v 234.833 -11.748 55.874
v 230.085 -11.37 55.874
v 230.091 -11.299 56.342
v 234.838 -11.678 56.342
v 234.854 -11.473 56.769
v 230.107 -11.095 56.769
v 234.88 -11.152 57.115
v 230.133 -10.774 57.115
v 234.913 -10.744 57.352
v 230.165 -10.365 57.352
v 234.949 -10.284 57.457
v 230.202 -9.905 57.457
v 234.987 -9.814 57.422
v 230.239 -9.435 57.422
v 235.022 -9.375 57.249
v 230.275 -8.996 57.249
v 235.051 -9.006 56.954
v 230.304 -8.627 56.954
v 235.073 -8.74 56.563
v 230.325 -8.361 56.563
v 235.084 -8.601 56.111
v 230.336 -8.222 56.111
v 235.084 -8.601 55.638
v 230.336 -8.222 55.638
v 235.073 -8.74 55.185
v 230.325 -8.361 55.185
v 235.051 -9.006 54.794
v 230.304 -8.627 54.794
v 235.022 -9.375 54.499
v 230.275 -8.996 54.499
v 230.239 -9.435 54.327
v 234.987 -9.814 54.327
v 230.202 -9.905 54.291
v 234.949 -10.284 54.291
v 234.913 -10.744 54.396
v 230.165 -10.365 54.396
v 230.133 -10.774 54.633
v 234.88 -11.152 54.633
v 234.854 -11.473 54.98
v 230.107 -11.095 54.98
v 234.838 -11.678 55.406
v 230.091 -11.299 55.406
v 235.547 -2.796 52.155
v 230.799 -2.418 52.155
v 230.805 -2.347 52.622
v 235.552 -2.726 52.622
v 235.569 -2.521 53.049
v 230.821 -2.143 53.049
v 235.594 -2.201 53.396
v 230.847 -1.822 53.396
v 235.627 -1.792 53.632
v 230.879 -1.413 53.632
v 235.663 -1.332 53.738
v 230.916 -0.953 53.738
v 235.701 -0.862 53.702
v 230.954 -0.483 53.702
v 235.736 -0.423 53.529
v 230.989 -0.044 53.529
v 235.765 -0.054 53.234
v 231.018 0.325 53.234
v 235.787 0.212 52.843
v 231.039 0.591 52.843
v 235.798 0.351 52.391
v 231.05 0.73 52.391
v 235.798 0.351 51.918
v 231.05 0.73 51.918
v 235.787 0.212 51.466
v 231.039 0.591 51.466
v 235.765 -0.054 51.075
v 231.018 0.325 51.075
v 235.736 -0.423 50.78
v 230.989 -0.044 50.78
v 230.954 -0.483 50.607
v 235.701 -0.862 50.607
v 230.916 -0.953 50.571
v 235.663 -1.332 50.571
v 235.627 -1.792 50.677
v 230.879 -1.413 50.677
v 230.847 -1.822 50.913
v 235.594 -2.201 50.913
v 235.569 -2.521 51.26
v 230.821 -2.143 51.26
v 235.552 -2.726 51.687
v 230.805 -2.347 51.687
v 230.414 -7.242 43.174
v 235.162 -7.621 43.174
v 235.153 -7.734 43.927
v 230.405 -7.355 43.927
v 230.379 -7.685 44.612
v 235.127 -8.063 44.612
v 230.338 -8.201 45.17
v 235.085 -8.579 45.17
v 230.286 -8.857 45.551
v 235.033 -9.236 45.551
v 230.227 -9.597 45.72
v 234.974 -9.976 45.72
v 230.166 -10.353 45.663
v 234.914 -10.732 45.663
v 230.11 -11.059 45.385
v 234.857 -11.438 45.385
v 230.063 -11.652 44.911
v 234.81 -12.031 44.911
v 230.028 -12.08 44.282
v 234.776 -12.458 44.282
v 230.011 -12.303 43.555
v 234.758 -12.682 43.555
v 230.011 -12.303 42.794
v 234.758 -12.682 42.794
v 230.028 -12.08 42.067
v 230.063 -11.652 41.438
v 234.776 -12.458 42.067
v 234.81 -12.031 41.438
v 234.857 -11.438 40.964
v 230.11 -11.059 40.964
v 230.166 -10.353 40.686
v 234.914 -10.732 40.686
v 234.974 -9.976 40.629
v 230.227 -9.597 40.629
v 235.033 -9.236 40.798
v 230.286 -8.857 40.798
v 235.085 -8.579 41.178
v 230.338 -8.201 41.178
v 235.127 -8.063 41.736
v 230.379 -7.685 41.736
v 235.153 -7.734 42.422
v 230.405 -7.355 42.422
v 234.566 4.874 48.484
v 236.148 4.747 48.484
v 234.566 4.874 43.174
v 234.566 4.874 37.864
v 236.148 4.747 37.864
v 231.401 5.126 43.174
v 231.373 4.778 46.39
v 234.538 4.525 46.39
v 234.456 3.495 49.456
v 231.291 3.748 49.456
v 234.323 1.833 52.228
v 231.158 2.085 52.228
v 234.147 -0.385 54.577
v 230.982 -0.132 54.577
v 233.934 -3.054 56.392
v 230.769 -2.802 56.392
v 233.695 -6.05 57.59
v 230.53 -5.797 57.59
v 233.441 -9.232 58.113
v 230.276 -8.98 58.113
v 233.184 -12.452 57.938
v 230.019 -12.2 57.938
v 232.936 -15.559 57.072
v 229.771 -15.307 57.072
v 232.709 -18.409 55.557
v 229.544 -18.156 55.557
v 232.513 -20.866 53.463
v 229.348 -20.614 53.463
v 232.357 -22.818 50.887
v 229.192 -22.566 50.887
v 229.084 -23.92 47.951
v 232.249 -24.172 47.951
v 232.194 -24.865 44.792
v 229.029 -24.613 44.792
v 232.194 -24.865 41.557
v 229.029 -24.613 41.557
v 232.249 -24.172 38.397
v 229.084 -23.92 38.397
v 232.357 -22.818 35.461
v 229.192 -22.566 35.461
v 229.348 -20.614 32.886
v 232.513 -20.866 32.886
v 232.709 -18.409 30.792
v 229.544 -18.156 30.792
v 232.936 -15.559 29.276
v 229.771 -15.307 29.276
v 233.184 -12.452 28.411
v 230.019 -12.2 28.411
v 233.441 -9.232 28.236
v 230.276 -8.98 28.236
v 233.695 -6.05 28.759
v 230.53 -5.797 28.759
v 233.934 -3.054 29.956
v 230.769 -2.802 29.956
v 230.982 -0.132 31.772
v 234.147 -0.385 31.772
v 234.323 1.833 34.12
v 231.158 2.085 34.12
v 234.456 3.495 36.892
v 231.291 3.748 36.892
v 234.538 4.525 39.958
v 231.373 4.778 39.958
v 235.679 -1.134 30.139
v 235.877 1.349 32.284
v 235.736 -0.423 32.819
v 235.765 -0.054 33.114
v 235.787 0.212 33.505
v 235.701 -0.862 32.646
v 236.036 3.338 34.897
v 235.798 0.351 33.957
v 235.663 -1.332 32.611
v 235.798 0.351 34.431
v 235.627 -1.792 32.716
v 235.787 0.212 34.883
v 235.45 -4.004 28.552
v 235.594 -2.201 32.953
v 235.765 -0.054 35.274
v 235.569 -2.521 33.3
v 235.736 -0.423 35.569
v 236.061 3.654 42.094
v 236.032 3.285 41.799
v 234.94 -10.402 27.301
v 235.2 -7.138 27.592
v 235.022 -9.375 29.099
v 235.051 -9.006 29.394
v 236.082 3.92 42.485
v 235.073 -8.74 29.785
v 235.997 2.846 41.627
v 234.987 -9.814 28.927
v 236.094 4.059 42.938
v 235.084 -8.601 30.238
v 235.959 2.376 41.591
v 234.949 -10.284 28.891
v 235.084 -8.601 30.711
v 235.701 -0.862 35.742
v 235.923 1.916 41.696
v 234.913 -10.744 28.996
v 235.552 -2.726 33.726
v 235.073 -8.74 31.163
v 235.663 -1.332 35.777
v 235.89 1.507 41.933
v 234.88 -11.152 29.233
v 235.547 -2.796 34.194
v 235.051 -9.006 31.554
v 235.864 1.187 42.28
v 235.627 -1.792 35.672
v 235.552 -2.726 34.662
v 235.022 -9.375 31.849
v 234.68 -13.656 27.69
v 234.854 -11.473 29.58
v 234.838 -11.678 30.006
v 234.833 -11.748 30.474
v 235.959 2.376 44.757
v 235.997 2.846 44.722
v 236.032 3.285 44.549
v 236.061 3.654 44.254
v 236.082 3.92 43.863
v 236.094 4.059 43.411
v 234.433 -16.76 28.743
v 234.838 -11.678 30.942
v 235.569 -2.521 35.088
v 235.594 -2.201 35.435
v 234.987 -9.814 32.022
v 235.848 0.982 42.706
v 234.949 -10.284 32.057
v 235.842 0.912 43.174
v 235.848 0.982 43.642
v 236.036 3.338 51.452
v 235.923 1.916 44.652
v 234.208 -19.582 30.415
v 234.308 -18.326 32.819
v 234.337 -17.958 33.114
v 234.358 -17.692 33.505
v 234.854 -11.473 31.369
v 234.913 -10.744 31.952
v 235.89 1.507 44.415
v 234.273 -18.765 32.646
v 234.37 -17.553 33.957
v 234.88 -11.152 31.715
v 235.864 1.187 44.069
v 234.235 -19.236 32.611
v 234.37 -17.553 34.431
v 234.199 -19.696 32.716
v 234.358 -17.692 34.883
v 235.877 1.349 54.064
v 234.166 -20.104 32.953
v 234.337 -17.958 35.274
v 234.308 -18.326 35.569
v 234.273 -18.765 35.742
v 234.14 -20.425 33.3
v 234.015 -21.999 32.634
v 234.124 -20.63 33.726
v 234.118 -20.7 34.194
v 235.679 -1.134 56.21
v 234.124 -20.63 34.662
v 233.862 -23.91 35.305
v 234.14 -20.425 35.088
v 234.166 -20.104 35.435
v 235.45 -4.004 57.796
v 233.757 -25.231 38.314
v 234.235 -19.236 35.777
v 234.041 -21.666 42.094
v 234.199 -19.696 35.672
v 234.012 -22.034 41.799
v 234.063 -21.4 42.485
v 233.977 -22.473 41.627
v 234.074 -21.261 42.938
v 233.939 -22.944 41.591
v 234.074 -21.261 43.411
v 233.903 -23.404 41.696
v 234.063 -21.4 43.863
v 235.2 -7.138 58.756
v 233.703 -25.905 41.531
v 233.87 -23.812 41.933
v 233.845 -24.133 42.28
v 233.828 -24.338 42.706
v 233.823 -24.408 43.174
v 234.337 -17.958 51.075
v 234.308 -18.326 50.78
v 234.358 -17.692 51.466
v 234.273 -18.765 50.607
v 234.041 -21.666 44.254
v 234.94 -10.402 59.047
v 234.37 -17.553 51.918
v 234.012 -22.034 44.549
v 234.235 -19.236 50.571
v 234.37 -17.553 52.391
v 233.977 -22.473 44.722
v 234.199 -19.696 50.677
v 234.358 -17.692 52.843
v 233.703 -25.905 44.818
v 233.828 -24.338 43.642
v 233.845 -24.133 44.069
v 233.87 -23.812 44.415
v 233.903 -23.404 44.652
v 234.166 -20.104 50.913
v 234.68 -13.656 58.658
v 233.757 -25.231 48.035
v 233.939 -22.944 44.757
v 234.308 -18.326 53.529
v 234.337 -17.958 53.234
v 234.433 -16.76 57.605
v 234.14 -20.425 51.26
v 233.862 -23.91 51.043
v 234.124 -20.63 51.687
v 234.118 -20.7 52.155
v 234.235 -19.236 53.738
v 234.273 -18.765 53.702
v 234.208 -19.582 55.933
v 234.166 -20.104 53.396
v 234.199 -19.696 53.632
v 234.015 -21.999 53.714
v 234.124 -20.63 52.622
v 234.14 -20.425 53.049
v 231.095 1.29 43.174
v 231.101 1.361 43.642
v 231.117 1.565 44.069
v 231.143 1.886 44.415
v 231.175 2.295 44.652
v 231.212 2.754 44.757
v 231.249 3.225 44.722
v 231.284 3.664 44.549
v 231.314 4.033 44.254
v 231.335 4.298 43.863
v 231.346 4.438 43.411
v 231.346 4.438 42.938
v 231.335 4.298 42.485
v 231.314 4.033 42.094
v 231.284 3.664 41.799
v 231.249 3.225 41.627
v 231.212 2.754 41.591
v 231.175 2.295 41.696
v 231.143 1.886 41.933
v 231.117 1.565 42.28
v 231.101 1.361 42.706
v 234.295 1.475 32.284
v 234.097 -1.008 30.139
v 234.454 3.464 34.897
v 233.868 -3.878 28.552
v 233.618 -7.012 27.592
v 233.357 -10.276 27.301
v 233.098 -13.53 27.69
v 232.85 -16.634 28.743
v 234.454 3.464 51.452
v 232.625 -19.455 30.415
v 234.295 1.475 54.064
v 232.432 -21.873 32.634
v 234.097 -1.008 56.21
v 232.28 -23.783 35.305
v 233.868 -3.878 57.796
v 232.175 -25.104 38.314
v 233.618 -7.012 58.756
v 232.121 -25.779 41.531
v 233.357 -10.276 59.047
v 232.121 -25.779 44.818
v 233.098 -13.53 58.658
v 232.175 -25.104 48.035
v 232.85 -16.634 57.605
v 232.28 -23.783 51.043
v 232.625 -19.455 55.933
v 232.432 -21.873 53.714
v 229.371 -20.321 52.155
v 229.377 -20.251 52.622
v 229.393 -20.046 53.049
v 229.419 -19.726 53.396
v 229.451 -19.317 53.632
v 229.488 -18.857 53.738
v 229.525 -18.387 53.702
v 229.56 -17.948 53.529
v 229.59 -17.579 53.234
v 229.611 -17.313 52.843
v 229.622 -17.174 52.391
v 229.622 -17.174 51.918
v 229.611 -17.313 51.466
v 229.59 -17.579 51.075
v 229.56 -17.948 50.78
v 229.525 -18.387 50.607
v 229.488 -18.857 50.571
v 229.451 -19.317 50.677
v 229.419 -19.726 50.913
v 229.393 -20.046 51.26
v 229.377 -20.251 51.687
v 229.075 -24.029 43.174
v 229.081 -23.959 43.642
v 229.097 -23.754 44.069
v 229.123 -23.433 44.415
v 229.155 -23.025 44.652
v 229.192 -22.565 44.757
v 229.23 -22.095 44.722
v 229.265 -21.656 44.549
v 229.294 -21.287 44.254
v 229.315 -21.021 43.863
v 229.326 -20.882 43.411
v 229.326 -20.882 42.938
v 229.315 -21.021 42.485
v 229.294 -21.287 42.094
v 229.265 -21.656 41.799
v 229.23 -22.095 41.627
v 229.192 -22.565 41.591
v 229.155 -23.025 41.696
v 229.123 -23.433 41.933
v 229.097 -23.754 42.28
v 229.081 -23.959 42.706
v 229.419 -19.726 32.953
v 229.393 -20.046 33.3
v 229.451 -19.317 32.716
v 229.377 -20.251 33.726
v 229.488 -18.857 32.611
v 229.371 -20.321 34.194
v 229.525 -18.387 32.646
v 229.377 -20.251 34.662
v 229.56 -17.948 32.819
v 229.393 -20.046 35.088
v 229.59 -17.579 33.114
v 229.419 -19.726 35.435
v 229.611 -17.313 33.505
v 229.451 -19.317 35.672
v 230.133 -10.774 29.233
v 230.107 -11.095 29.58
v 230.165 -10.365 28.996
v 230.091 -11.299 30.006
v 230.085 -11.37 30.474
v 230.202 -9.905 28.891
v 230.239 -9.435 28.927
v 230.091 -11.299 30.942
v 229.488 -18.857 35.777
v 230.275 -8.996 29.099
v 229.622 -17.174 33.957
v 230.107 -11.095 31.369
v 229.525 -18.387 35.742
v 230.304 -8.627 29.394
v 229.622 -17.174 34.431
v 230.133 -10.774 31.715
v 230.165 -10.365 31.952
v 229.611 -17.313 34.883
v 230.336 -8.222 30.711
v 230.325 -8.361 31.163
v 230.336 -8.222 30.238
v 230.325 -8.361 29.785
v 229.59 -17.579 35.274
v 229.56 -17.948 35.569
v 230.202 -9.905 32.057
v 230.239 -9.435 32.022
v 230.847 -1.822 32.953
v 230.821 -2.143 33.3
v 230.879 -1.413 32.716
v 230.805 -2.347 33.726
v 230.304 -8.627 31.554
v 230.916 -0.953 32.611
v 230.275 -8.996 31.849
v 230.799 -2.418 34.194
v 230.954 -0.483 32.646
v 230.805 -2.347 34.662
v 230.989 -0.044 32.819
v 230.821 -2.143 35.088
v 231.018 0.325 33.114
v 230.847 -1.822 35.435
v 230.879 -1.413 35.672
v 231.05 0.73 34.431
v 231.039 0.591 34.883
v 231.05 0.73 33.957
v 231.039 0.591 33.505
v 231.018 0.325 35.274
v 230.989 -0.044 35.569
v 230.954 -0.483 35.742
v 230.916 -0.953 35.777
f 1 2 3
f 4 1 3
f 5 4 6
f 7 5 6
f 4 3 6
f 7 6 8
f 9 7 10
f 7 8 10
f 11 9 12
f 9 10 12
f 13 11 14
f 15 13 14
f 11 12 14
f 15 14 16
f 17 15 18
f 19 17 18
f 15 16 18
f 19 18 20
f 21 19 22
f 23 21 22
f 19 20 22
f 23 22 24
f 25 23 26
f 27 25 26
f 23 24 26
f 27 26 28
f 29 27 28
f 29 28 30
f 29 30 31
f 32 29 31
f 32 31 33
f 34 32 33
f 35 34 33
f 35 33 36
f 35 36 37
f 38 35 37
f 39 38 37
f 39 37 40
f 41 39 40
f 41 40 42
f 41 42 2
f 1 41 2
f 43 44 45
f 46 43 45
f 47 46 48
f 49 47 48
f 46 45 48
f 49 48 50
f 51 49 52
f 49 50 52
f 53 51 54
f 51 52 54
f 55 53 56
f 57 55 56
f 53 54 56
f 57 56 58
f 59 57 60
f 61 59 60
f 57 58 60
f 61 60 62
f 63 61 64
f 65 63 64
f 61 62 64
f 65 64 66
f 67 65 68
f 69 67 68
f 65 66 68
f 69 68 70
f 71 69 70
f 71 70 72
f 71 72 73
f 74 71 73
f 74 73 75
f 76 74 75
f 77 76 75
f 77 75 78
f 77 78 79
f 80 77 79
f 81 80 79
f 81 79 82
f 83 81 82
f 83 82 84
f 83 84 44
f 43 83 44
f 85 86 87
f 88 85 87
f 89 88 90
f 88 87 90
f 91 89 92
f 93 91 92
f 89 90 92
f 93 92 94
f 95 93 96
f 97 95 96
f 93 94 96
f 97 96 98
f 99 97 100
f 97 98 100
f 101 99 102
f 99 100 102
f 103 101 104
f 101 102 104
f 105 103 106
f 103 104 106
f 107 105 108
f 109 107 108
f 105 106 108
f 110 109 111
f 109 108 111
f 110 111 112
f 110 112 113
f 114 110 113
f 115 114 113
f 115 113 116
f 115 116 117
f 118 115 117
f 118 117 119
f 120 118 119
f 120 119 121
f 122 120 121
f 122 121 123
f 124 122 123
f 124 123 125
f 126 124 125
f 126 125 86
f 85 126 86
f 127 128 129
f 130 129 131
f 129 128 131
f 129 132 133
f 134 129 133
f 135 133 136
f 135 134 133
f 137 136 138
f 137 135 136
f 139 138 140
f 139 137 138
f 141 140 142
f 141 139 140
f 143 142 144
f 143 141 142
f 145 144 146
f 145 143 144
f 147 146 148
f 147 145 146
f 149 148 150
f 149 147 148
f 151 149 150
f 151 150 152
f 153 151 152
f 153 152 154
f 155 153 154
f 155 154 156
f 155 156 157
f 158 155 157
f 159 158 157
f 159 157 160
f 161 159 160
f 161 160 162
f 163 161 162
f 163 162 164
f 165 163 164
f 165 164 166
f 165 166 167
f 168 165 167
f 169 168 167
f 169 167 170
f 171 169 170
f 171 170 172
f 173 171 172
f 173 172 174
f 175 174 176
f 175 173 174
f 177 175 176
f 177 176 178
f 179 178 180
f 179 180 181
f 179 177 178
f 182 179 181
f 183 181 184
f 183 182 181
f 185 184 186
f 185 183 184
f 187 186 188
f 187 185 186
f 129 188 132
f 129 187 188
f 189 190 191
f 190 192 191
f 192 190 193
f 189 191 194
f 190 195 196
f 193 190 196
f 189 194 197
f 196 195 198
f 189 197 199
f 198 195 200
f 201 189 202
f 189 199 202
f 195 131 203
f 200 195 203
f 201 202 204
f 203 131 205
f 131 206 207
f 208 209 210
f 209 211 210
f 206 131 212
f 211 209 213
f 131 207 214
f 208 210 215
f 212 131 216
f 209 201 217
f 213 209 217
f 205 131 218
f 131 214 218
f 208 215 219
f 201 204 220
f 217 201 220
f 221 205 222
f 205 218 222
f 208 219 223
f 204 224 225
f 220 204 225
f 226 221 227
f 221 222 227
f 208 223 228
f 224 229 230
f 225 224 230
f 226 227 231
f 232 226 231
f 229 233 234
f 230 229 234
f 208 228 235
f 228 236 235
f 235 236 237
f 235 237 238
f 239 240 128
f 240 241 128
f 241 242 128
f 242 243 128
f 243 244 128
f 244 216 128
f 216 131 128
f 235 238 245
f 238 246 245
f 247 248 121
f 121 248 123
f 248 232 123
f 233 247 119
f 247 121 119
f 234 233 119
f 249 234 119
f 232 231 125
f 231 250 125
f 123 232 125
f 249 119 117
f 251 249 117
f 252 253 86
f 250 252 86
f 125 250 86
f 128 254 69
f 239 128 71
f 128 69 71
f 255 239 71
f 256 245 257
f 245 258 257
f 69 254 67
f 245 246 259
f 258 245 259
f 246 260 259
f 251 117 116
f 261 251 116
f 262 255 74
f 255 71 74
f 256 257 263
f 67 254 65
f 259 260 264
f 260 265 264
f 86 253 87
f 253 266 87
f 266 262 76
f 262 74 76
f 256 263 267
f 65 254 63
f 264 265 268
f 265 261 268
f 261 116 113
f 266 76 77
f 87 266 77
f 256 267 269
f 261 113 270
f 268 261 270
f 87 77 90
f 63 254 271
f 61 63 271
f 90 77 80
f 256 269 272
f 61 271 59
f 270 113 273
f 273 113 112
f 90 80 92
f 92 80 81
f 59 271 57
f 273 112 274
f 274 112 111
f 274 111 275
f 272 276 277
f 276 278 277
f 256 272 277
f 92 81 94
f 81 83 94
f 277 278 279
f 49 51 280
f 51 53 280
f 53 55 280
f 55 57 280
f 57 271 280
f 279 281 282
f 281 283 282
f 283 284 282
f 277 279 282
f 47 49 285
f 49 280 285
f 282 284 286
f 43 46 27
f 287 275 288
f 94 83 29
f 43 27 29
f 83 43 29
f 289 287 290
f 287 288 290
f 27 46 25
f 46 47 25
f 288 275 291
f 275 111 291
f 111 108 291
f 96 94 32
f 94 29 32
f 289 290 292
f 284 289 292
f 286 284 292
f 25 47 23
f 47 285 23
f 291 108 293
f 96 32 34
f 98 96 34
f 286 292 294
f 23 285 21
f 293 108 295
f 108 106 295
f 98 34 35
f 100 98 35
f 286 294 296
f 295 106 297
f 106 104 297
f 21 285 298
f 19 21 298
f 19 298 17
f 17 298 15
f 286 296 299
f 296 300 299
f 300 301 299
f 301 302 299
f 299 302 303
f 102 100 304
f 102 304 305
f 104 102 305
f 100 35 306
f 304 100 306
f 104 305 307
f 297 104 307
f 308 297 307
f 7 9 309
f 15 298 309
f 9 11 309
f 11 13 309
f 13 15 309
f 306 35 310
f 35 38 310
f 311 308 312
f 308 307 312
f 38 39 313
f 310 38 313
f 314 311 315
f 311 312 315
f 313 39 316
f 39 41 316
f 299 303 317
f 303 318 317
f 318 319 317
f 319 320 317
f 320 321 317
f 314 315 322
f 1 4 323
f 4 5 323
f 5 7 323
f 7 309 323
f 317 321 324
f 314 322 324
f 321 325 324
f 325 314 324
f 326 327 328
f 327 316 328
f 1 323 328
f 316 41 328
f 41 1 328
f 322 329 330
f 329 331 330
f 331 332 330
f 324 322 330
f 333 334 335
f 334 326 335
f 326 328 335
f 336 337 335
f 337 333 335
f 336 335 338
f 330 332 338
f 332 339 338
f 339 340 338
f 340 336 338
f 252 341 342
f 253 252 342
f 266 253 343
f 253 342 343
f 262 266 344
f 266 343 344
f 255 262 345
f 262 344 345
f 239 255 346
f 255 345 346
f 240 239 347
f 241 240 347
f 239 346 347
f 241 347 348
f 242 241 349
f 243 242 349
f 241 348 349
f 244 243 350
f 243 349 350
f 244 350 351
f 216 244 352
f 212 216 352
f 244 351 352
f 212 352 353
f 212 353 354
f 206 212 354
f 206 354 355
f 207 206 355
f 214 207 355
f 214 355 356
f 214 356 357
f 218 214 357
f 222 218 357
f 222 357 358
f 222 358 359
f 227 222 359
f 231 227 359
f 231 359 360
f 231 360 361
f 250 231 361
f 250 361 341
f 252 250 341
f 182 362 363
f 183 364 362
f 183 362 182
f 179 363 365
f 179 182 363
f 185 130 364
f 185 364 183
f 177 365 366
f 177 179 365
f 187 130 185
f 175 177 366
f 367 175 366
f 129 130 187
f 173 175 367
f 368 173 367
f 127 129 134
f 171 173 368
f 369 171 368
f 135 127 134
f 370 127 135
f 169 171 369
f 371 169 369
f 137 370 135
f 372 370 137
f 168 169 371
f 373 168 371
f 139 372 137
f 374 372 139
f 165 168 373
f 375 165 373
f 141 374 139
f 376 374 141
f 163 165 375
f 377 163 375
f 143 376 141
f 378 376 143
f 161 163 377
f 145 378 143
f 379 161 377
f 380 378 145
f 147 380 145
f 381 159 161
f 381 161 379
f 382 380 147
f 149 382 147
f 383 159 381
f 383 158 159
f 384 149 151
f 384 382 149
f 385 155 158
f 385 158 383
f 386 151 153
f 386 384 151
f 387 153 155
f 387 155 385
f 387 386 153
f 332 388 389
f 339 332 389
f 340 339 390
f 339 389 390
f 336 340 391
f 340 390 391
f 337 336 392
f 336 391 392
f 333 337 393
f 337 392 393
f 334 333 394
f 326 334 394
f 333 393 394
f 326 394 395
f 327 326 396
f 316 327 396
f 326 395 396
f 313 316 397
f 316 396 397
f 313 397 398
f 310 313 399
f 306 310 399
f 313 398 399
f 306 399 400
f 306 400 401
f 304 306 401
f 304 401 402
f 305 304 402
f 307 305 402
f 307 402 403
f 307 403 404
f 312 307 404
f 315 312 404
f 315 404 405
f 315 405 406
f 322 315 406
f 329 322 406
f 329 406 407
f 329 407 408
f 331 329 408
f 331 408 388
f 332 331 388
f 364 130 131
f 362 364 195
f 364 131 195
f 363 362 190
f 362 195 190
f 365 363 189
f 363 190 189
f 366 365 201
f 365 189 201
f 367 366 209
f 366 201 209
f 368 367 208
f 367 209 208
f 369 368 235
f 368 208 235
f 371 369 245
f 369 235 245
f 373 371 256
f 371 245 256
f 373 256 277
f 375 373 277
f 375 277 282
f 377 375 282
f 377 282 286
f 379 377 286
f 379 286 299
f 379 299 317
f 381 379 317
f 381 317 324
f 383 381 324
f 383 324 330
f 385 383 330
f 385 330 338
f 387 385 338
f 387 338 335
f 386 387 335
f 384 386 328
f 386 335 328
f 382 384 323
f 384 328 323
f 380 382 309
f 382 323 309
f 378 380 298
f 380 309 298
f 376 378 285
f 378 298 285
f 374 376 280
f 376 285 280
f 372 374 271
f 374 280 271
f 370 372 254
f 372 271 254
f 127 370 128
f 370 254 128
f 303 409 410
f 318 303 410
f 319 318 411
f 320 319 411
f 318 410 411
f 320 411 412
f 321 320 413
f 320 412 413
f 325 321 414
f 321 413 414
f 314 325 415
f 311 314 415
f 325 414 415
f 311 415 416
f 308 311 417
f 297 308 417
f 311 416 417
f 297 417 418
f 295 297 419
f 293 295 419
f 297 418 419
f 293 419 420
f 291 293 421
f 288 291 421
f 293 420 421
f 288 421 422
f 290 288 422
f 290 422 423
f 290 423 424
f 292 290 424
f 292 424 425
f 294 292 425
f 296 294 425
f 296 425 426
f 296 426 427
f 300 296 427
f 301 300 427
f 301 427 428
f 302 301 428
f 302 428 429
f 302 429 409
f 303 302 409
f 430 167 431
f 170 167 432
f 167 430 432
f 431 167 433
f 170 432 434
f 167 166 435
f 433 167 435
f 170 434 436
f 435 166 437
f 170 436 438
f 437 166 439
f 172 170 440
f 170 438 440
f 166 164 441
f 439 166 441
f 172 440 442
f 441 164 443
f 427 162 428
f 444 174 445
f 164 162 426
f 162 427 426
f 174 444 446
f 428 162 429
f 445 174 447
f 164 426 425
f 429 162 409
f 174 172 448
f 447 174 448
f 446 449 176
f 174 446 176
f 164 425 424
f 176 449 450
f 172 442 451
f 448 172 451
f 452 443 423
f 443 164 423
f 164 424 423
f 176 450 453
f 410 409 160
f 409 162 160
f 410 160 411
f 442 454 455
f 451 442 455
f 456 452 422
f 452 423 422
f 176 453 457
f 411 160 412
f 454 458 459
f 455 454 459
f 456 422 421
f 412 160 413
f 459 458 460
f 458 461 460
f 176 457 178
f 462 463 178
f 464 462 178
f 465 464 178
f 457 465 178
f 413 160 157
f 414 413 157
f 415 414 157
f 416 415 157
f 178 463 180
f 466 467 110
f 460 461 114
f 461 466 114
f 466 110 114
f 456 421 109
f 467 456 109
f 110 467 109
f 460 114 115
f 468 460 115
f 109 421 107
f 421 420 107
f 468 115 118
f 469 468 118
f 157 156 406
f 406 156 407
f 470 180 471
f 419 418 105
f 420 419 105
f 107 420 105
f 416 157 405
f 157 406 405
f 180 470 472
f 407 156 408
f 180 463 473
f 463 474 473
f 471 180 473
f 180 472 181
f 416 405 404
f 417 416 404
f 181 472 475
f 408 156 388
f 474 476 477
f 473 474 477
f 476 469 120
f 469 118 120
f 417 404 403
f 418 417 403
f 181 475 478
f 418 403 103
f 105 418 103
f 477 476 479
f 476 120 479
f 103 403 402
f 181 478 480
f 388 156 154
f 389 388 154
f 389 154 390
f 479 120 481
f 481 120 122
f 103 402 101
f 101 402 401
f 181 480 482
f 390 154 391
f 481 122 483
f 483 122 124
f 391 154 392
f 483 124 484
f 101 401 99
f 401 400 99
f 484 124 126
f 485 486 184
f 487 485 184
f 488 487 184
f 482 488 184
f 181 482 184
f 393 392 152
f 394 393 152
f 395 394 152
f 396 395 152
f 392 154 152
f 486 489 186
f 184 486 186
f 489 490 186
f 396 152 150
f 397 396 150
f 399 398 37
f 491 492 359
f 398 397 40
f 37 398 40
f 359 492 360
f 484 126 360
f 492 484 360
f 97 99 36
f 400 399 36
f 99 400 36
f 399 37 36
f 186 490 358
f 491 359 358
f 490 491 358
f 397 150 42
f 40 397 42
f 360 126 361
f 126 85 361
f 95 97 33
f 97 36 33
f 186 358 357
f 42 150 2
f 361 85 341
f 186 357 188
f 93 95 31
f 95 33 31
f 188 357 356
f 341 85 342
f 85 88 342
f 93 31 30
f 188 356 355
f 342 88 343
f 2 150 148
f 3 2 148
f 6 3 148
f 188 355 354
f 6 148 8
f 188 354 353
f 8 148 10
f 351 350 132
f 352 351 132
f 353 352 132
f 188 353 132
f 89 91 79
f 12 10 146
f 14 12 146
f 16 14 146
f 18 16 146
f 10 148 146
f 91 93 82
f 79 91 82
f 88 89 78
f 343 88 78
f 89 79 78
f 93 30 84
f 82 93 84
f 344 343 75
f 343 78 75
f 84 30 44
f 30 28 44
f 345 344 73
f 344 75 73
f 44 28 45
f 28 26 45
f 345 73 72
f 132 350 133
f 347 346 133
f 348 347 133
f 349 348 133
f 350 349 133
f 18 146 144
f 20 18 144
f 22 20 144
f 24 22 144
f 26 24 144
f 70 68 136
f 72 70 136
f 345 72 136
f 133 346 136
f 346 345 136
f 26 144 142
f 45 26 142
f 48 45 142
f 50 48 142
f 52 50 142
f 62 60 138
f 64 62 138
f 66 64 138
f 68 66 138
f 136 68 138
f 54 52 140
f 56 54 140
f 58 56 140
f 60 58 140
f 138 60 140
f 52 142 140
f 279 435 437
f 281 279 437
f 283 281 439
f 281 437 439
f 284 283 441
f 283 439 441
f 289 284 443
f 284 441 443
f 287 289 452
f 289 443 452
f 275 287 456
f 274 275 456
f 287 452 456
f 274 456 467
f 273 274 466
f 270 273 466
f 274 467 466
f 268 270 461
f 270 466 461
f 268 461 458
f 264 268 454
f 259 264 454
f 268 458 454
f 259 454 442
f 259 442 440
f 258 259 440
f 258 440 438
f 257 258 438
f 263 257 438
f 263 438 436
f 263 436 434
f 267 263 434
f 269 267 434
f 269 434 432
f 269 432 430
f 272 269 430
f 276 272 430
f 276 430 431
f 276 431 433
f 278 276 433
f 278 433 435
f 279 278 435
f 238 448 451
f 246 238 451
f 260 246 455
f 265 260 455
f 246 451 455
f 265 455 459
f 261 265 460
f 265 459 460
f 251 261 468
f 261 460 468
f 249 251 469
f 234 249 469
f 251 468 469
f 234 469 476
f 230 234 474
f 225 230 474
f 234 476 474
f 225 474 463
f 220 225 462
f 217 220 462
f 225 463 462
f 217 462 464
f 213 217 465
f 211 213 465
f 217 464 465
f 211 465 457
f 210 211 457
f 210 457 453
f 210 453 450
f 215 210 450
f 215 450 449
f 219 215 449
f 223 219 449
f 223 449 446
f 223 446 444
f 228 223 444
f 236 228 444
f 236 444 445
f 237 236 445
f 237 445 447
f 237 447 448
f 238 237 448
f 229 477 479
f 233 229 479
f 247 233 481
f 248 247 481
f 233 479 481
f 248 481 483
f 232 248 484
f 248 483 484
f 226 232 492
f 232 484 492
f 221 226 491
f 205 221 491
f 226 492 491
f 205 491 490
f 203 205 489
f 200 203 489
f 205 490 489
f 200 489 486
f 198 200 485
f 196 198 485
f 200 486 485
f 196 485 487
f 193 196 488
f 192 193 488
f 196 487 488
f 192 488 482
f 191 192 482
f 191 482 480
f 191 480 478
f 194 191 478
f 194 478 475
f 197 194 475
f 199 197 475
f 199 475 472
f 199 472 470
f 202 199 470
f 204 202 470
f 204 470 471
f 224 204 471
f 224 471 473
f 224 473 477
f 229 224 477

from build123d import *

# Parameters (mm, degrees)
SKETCH1_R           = 14.9606
BOSS_EXTRUDE1_DEPTH = 4.7625
SKETCH2_R           = 2.5527
CUT_EXTRUDE1_DEPTH  = 6.35
SKETCH3_R           = 1.5875
CUT_EXTRUDE2_DEPTH  = 10
SKETCH5_R           = 15.875
SKETCH5_R_2         = 14.9606
BOSS_EXTRUDE2_DEPTH = 1.5875
CUT_EXTRUDE3_DEPTH  = 2.54


with BuildPart() as part:
    # Sketch1 → Boss-Extrude1 (new body)
    with BuildSketch(Plane(origin=(234.278878836, -18.689027227, 0), x_dir=(0, 0, -1), z_dir=(0.9968332748770866, -0.0795199477981641, 0))):
        with Locations(Location((-43.174261814, 8.550344032, 0), (0, 0, 90))):
            Circle(SKETCH1_R)
    extrude(amount=-BOSS_EXTRUDE1_DEPTH)

    # Sketch2 → Cut-Extrude1 (cut)
    with BuildSketch(Plane(origin=(234.278878836, -18.689027227, 0), x_dir=(0, 0, -1), z_dir=(0.9968332748770866, -0.07951994779816411, 0))):
        with Locations(Location((-43.174261814, 8.550344032, 0), (0, 0, 90))):
            Circle(SKETCH2_R)
    extrude(amount=-CUT_EXTRUDE1_DEPTH, mode=Mode.SUBTRACT)

    # Sketch3 → Cut-Extrude2 (cut)
    with BuildSketch(Plane(origin=(229.531460364, -18.310313476, 0), x_dir=(0, 0, 1), z_dir=(-0.9968332748770866, 0.07951994779816411, 0))):
        with Locations(Location((30.474261814, 8.550344032, 0), (0, 0, 270))):
            Circle(SKETCH3_R)
        with Locations(Location((43.174261814, 21.250344032, 0), (0, 0, 270))):
            Circle(SKETCH3_R)
        with Locations(Location((52.154517935, 17.530600153, 0), (0, 0, 270))):
            Circle(SKETCH3_R)
        with Locations(Location((55.874261814, 8.550344032, 0), (0, 0, 270))):
            Circle(SKETCH3_R)
        with Locations(Location((52.154517935, -0.429912089, 0), (0, 0, 270))):
            Circle(SKETCH3_R)
        with Locations(Location((43.174261814, -4.149655968, 0), (0, 0, 270))):
            Circle(SKETCH3_R)
        with Locations(Location((34.194005693, -0.429912089, 0), (0, 0, 270))):
            Circle(SKETCH3_R)
        with Locations(Location((34.194005693, 17.530600153, 0), (0, 0, 270))):
            Circle(SKETCH3_R)
    extrude(amount=-CUT_EXTRUDE2_DEPTH, mode=Mode.SUBTRACT)

    # Sketch5 → Boss-Extrude2 (add)
    with BuildSketch(Plane(origin=(234.278878836, -18.689027227, 0), x_dir=(0, 0, 1), z_dir=(-0.9968332748770866, 0.07951994779816411, 0))):
        with Locations(Location((43.174261814, 8.550344032, 0), (0, 0, 270))):
            Circle(SKETCH5_R)
        with Locations(Location((43.174261814, 8.550344032, 0), (0, 0, 90))):
            Circle(SKETCH5_R_2, mode=Mode.SUBTRACT)
    extrude(amount=BOSS_EXTRUDE2_DEPTH)

    # Sketch6 → Cut-Extrude3 (cut)
    with BuildSketch(Plane(origin=(234.278878836, -18.689027227, 0), x_dir=(0, 0, -1), z_dir=(0.9968332748770866, -0.07951994779816411, 0))):
        Polygon((-133.921695756, 23.510944032), (-48.484259238, 23.510944032), (-37.864264391, 23.510944032), (47.573172128, 23.510944032), (47.573172128, 194.385817069), (-133.921695756, 194.385817069), align=None)
    extrude(amount=-CUT_EXTRUDE3_DEPTH, mode=Mode.SUBTRACT)


solid = part.part
